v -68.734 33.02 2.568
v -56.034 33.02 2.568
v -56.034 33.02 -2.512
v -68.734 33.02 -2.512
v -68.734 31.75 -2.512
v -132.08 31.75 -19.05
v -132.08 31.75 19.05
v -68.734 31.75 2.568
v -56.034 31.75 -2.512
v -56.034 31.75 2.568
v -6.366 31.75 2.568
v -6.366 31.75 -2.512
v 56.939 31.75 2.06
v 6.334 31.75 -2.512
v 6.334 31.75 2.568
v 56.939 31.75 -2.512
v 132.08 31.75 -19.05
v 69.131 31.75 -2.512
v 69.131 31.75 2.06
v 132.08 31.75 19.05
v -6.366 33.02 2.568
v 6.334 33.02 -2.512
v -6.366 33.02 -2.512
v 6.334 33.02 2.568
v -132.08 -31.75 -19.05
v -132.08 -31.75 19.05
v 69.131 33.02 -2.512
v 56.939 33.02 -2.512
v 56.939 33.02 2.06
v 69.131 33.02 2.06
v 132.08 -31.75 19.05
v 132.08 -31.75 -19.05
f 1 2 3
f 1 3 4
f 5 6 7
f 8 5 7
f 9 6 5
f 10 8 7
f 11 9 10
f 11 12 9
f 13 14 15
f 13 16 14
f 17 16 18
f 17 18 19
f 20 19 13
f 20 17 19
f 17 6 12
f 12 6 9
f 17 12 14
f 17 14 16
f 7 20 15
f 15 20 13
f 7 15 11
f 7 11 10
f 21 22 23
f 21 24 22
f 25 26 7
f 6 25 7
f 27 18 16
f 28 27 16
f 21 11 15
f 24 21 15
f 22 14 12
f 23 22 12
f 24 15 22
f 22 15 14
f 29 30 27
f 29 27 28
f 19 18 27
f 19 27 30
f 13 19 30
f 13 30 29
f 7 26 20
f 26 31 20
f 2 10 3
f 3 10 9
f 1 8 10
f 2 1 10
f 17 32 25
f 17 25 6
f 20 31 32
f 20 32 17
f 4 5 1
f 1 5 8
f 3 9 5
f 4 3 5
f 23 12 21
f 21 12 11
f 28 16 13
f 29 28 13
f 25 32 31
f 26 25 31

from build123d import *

# Parameters (mm, degrees)
F0_W     = 63.5
F0_H     = 38.1
F1_DEPTH = 132.08
F2_W     = 12.192
F2_H     = 4.572
F3_DEPTH = 1.27


with BuildPart() as f1:
    # F0 (on Right) → F1 (new body, symmetric)
    with BuildSketch(Plane.YZ):
        Rectangle(F0_W, F0_H)
    extrude(amount=F1_DEPTH, both=True)

    # F2 (on face) → F3 (join)
    with BuildSketch(Plane(origin=(0, 31.75, 0), x_dir=(-1, 0, 0), z_dir=(0, 1, 0))):
        with Locations((-63.034566, -0.225544)):
            Rectangle(F2_W, F2_H)
        Polygon((-6.334301, 2.060456), (-6.334301, -2.511544), (6.365699, -2.511544), (6.365699, 2.568456), (5.857699, 2.568456), (-6.334301, 2.568456), align=None)
        Polygon((68.733813, -2.511544), (68.733813, 2.568456), (68.225813, 2.568456), (56.033813, 2.568456), (56.033813, 2.060456), (56.033813, -2.511544), align=None)
    extrude(amount=F3_DEPTH)


solid = f1.part
